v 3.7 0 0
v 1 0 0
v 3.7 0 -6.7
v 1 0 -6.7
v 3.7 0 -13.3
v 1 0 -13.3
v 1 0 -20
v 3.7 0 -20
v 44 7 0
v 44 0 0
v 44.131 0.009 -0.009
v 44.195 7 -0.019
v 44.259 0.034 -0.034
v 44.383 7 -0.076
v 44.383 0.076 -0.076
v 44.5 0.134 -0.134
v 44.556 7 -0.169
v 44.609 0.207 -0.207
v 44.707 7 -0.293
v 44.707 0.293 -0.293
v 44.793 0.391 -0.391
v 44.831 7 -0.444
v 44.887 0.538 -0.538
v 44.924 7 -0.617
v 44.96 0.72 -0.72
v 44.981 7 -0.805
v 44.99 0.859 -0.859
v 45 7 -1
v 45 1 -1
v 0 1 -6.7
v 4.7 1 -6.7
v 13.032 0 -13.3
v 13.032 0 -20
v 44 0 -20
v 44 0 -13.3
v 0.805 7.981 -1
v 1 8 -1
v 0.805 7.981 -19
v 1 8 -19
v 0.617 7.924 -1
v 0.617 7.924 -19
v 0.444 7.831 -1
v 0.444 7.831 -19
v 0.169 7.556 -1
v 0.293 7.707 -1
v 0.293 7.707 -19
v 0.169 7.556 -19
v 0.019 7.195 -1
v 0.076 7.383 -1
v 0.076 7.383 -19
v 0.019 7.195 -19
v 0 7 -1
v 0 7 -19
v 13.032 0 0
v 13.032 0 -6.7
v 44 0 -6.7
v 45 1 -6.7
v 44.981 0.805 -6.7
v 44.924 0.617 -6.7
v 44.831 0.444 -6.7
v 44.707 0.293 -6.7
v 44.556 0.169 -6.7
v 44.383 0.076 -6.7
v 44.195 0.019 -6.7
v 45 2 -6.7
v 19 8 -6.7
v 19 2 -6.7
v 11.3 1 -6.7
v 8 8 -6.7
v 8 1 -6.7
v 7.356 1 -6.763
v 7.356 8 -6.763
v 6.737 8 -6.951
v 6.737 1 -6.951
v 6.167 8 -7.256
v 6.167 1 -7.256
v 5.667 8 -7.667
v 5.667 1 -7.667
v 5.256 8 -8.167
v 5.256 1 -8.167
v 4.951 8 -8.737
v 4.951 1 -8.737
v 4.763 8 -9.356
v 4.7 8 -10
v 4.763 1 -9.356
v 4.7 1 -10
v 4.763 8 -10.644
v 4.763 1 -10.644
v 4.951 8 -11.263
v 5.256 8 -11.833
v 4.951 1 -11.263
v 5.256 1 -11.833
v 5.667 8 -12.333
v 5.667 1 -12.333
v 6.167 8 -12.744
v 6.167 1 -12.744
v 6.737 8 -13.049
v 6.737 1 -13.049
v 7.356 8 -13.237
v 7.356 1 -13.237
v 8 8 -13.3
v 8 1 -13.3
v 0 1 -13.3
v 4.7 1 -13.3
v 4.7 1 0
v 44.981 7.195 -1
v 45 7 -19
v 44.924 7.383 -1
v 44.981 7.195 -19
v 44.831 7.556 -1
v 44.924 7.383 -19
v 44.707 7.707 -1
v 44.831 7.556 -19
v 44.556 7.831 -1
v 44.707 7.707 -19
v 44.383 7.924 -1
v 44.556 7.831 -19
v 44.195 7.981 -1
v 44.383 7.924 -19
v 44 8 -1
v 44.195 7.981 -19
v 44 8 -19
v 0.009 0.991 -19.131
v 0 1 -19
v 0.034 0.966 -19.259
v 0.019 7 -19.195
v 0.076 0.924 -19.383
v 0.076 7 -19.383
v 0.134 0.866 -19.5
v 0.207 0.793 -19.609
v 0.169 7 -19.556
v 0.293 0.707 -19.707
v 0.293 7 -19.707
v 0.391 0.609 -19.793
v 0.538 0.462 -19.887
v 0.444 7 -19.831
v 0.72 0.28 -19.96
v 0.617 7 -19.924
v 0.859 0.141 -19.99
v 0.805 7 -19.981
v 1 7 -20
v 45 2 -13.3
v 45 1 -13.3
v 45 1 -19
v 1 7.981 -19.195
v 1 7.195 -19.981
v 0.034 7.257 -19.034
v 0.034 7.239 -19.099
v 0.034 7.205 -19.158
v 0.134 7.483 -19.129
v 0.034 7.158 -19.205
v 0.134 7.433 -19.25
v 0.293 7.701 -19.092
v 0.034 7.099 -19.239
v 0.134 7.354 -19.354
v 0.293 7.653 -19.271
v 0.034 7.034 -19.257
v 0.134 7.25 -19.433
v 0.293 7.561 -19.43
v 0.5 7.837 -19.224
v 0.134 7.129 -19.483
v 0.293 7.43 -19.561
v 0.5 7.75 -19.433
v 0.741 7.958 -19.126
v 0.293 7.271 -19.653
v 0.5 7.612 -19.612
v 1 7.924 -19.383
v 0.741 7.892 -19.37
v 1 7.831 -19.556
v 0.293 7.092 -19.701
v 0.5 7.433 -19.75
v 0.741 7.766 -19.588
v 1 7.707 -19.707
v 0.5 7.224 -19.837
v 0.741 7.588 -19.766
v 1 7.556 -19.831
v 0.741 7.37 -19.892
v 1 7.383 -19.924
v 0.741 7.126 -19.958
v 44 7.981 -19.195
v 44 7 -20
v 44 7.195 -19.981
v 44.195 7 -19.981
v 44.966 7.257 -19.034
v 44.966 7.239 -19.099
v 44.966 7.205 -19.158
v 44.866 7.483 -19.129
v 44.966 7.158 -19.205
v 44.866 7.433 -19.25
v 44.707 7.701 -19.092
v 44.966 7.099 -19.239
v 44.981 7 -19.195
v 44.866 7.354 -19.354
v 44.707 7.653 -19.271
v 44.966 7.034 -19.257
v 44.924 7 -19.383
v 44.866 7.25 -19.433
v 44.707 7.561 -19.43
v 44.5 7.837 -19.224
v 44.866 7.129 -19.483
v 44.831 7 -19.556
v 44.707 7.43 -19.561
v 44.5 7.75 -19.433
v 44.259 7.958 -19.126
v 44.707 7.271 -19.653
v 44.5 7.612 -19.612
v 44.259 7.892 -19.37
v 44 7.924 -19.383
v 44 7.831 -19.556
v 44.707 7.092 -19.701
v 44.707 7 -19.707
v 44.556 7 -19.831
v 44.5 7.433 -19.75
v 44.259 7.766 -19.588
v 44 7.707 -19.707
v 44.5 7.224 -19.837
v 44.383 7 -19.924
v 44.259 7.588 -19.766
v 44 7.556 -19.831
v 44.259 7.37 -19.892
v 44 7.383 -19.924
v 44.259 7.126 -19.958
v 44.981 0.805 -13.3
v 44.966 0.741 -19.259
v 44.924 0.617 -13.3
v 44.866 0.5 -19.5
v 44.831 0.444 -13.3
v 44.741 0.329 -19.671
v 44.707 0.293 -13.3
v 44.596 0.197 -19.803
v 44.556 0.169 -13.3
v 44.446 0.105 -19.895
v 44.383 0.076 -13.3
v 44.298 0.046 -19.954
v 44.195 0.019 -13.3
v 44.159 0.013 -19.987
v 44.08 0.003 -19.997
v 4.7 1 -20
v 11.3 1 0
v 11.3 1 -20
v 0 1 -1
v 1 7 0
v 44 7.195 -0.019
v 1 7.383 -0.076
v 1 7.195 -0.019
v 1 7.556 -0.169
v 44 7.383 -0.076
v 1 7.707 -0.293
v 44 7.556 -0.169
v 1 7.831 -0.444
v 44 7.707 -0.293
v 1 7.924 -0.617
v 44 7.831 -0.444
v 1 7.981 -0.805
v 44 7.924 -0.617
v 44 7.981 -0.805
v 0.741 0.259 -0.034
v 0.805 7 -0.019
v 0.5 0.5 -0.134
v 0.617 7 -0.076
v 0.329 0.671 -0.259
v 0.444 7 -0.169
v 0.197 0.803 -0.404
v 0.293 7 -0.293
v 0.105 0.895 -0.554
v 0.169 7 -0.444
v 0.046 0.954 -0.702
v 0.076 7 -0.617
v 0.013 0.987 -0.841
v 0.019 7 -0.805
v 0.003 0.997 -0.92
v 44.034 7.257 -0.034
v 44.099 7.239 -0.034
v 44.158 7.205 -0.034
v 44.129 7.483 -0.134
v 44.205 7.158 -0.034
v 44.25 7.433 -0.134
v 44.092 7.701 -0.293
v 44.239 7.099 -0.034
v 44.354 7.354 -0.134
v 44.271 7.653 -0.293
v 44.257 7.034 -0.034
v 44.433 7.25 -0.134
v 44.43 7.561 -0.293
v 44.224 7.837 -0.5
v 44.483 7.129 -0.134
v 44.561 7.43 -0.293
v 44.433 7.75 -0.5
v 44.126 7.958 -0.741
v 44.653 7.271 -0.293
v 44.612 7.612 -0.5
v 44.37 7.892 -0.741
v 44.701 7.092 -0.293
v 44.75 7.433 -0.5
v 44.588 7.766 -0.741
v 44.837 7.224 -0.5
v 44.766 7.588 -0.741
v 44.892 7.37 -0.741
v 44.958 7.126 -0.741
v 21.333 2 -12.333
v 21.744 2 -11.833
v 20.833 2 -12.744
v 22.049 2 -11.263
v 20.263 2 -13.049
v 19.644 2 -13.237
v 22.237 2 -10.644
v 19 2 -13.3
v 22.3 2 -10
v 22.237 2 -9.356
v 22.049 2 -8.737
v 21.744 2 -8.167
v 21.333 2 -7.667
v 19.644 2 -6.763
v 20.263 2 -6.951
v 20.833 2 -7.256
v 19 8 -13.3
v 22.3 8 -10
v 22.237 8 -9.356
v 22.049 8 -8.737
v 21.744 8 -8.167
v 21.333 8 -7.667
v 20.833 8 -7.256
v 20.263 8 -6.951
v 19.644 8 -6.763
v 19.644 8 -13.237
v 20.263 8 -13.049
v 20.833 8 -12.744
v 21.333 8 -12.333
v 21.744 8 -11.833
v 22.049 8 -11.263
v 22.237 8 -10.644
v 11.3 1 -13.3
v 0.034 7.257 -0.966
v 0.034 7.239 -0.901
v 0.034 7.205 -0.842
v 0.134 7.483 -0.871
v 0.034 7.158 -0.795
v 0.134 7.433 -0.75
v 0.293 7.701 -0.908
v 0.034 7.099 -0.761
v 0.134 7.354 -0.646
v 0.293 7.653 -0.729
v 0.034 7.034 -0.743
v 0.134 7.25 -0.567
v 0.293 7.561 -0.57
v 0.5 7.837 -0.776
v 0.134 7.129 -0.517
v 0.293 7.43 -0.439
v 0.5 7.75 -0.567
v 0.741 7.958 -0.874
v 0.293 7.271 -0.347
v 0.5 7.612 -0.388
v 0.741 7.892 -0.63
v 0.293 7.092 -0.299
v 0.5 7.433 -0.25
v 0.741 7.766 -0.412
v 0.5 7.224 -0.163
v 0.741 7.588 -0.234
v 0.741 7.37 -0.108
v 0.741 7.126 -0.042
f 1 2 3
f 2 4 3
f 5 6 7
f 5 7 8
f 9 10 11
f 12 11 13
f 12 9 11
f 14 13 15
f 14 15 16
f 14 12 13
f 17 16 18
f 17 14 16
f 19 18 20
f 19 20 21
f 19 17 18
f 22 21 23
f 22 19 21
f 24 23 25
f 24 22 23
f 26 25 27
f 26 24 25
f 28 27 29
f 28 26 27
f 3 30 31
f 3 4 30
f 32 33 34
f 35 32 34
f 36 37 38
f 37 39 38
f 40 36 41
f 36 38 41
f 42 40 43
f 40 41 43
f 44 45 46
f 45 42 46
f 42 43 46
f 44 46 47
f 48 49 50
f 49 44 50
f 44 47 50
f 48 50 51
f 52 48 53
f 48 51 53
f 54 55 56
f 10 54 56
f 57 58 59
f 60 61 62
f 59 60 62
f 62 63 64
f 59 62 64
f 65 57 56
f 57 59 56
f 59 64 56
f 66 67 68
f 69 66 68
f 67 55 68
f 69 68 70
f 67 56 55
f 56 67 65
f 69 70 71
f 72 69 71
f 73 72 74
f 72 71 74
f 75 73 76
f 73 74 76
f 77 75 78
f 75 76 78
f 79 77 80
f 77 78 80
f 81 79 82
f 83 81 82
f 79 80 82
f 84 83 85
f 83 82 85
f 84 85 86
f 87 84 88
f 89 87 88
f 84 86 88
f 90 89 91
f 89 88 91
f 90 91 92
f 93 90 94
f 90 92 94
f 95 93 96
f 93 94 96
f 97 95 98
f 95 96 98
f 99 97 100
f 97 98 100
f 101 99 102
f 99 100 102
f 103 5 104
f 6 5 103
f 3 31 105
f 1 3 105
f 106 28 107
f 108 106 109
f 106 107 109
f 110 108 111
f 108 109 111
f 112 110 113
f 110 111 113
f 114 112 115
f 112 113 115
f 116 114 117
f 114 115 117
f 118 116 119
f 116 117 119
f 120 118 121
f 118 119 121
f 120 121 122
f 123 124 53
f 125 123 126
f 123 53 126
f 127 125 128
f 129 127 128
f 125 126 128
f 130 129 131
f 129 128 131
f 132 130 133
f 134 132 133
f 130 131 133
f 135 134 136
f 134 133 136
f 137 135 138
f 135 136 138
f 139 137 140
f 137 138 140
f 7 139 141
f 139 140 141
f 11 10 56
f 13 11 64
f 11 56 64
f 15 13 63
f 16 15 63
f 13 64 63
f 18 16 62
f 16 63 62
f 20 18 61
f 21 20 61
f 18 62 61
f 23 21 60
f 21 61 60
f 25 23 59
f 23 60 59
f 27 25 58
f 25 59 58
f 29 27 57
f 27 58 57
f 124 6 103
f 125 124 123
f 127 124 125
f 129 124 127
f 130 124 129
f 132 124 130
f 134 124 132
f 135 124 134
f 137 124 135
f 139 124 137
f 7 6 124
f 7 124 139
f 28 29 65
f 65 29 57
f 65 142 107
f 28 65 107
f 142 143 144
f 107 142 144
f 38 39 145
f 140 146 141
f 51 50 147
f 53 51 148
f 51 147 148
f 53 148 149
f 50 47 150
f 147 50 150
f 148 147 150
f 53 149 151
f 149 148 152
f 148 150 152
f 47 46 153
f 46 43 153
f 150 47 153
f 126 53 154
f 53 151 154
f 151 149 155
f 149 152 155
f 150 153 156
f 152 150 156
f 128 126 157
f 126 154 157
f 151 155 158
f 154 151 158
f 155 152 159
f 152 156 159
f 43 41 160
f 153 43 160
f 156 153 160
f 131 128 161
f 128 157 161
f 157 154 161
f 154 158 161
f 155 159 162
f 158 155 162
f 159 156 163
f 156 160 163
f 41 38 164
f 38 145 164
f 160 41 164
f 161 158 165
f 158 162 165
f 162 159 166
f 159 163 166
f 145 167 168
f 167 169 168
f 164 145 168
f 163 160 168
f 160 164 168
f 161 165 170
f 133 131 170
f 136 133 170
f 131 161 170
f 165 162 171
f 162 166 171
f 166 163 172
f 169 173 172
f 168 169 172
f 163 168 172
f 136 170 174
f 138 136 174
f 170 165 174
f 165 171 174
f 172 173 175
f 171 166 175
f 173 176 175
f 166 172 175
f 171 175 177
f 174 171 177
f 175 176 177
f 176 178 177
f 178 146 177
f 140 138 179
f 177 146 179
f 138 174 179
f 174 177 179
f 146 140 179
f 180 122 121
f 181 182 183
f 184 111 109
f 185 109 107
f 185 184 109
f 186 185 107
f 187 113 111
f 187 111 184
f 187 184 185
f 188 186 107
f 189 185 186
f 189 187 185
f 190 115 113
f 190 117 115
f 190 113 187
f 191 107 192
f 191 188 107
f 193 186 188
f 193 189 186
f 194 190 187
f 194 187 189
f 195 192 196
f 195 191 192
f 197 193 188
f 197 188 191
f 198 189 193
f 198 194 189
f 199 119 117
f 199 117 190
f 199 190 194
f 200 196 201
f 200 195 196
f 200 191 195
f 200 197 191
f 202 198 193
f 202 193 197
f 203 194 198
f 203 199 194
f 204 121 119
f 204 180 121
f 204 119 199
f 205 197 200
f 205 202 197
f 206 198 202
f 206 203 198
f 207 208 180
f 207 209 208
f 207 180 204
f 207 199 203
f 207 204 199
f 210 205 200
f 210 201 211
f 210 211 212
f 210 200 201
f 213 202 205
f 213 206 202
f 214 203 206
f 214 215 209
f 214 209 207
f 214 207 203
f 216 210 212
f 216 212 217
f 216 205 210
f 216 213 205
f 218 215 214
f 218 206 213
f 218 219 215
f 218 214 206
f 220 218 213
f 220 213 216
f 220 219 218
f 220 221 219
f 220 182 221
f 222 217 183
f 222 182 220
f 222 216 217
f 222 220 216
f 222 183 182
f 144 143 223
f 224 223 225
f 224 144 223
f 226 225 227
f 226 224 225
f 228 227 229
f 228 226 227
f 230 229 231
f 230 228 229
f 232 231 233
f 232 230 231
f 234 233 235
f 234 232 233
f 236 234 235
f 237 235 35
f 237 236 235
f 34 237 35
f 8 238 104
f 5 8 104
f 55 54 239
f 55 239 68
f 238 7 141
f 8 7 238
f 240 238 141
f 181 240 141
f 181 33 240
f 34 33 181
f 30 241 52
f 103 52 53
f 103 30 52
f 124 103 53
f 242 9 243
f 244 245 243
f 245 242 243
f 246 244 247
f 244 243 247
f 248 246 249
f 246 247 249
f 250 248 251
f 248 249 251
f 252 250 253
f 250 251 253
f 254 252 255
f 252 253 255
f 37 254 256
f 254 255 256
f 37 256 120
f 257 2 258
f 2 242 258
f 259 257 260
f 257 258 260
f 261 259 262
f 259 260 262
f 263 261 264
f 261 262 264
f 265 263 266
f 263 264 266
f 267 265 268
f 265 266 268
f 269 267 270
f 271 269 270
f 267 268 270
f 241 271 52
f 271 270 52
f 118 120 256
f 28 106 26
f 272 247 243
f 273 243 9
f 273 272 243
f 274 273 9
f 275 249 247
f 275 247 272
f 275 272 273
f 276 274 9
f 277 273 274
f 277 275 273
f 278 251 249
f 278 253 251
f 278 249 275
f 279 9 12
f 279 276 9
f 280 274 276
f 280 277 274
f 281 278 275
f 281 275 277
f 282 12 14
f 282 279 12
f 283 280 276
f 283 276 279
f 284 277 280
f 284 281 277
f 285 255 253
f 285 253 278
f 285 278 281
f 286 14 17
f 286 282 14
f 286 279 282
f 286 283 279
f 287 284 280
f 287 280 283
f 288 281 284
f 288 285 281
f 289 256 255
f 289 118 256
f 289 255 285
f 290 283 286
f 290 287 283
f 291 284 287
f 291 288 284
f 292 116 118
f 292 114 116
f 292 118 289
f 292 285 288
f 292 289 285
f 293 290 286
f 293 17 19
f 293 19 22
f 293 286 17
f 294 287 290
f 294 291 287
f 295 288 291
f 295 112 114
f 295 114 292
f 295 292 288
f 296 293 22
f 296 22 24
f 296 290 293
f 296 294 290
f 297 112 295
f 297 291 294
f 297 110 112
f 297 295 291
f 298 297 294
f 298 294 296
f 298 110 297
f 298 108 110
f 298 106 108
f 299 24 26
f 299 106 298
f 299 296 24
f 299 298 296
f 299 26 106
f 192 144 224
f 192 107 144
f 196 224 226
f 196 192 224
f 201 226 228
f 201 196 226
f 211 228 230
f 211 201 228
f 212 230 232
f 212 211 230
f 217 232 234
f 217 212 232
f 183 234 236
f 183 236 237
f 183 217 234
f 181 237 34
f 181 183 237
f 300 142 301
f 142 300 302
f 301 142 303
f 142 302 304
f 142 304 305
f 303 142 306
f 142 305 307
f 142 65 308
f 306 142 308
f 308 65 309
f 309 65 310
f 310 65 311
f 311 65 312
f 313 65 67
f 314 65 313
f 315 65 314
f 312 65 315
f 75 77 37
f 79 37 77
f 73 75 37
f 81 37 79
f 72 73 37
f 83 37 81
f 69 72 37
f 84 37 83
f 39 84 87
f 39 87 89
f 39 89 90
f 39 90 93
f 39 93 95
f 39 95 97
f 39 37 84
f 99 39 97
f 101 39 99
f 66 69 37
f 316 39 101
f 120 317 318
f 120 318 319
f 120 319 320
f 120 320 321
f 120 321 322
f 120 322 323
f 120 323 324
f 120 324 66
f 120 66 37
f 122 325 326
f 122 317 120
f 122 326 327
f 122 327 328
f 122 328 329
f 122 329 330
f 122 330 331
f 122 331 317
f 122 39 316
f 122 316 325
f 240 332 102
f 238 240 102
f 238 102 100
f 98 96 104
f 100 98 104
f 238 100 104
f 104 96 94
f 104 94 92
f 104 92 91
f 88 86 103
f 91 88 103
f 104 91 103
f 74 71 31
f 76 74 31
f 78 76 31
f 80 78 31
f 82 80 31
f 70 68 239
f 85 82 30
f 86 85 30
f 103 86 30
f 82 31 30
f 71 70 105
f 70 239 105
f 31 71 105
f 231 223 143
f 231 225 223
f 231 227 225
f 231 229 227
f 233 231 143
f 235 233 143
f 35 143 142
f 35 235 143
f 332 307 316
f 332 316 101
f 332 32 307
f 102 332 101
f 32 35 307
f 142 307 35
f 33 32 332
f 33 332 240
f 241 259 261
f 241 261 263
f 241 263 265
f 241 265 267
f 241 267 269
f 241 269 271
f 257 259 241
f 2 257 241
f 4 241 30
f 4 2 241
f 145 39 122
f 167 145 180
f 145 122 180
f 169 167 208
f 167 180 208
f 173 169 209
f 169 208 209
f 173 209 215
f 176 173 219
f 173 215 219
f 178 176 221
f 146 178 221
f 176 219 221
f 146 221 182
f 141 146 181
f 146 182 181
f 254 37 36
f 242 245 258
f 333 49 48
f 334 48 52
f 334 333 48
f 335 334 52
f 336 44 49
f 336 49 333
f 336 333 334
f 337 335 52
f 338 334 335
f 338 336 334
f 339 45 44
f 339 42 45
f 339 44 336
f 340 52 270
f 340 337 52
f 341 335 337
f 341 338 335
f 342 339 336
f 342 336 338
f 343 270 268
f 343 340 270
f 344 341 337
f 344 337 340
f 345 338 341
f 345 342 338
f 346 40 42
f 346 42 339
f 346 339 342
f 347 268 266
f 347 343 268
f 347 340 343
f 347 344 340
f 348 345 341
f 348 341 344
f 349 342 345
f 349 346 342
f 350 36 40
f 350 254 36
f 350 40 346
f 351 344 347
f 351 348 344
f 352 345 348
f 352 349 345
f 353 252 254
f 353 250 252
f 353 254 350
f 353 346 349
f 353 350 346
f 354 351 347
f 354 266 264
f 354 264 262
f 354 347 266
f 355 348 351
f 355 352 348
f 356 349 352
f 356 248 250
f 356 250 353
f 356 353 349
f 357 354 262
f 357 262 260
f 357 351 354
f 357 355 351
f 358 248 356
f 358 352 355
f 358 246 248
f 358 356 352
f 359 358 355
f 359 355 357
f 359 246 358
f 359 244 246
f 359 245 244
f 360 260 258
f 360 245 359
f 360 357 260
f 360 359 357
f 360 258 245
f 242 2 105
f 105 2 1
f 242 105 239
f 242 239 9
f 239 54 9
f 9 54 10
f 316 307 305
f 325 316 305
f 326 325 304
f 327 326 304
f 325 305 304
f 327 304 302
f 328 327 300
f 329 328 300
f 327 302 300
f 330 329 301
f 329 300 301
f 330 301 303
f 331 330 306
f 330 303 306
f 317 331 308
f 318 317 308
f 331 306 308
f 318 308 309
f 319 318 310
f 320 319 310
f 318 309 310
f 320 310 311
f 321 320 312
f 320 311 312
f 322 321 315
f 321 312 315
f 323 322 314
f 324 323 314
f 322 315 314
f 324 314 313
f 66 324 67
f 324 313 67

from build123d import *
from OCP.BRepFilletAPI import BRepFilletAPI_MakeChamfer

# Parameters (mm, degrees)
SKETCH_1_W          = 45
SKETCH_1_H          = 20
EXTRUDE_1_DEPTH     = 8
CUT_EXTRUDE_1_DEPTH = 2
CUT_EXTRUDE_2_DEPTH = 1
CHAMFER_1_SIZE      = 1
CHAMFER_2_SIZE      = 1
CHAMFER_2_SIZE_2    = 1.732050808
FILLET_1_R          = 1


with BuildPart() as part:
    # 草图1 → 凸台-拉伸1 (new body)
    with BuildSketch(Plane(origin=(0, 0, 0), x_dir=(1, 0, 0), z_dir=(0, 1, 0))):
        with Locations((22.5, 10)):
            Rectangle(SKETCH_1_W, SKETCH_1_H)
        with BuildLine():
            Line((19, 6.7), (8, 6.7))
            ThreePointArc((8, 6.7), (4.7, 10), (8, 13.3))
            Line((8, 13.3), (19, 13.3))
            ThreePointArc((19, 13.3), (22.3, 10), (19, 6.7))
        make_face(mode=Mode.SUBTRACT)
    extrude(amount=EXTRUDE_1_DEPTH)

    # 草图2 → 切除-拉伸1 (cut)
    with BuildSketch(Plane.XZ):
        with BuildLine():
            Line((45, -6.7), (45, -13.3))
            Line((45, -13.3), (8, -13.3))
            ThreePointArc((8, -13.3), (4.7, -10), (8, -6.7))
            Line((8, -6.7), (45, -6.7))
        make_face()
    extrude(amount=-CUT_EXTRUDE_1_DEPTH, mode=Mode.SUBTRACT)

    # 草图3 → 切除-拉伸2 (cut)
    with BuildSketch(Plane.XZ):
        Polygon((0, -6.7), (4.7, -6.7), (4.7, 0), (11.3, 0), (11.3, -20), (4.7, -20), (4.7, -13.3), (0, -13.3), align=None)
    extrude(amount=-CUT_EXTRUDE_2_DEPTH, mode=Mode.SUBTRACT)

    # 倒角1
    chamfer_1_edges = [part.edges().sort_by_distance(p)[0] for p in [
        (0, 0, -16.65),
        (4.7, 0, -16.65),
        (4.7, 0, -3.35),
        (0, 0, -3.35),
    ]]
    chamfer(chamfer_1_edges, length=CHAMFER_1_SIZE - 0.0001)  # a hair under: the kernel refuses the full size

    # 倒角2
    chamfer_2_edges_1 = [part.edges().sort_by_distance(p)[0] for p in [
        (11.3, 0, -16.65),
    ]]
    chamfer_2_side_1 = [part.faces().sort_by_distance(p)[0] for p in [
        (11.3, 0.02, -16.65),
    ]]
    chamfer_2_edges_2 = [part.edges().sort_by_distance(p)[0] for p in [
        (11.3, 0, -3.35),
    ]]
    chamfer_2_side_2 = [part.faces().sort_by_distance(p)[0] for p in [
        (11.3, 0.02, -3.35),
    ]]
    chamfer_2 = BRepFilletAPI_MakeChamfer(part.part.solid().wrapped)
    for e in chamfer_2_edges_1:
        chamfer_2.Add(CHAMFER_2_SIZE - 0.0001, CHAMFER_2_SIZE_2 - 0.0001, e.wrapped, chamfer_2_side_1[0].wrapped)
    for e in chamfer_2_edges_2:
        chamfer_2.Add(CHAMFER_2_SIZE - 0.0001, CHAMFER_2_SIZE_2 - 0.0001, e.wrapped, chamfer_2_side_2[0].wrapped)
    add(Compound.cast(chamfer_2.Shape()), mode=Mode.REPLACE)  # a hair under: the kernel refuses the full size

    # 圆角1
    fillet_1_edges = [part.edges().sort_by_distance(p)[0] for p in [
        (22.5, 8, -20),
        (45, 8, -10),
        (22.5, 8, 0),
        (0, 8, -10),
        (45, 4, 0),
        (45, 4, -20),
        (0, 4.49995, -20),
        (0, 4.49995, 0),
        (45, 0, -16.65),
        (45, 0, -3.35),
    ]]
    fillet(fillet_1_edges, radius=FILLET_1_R)


solid = part.part
